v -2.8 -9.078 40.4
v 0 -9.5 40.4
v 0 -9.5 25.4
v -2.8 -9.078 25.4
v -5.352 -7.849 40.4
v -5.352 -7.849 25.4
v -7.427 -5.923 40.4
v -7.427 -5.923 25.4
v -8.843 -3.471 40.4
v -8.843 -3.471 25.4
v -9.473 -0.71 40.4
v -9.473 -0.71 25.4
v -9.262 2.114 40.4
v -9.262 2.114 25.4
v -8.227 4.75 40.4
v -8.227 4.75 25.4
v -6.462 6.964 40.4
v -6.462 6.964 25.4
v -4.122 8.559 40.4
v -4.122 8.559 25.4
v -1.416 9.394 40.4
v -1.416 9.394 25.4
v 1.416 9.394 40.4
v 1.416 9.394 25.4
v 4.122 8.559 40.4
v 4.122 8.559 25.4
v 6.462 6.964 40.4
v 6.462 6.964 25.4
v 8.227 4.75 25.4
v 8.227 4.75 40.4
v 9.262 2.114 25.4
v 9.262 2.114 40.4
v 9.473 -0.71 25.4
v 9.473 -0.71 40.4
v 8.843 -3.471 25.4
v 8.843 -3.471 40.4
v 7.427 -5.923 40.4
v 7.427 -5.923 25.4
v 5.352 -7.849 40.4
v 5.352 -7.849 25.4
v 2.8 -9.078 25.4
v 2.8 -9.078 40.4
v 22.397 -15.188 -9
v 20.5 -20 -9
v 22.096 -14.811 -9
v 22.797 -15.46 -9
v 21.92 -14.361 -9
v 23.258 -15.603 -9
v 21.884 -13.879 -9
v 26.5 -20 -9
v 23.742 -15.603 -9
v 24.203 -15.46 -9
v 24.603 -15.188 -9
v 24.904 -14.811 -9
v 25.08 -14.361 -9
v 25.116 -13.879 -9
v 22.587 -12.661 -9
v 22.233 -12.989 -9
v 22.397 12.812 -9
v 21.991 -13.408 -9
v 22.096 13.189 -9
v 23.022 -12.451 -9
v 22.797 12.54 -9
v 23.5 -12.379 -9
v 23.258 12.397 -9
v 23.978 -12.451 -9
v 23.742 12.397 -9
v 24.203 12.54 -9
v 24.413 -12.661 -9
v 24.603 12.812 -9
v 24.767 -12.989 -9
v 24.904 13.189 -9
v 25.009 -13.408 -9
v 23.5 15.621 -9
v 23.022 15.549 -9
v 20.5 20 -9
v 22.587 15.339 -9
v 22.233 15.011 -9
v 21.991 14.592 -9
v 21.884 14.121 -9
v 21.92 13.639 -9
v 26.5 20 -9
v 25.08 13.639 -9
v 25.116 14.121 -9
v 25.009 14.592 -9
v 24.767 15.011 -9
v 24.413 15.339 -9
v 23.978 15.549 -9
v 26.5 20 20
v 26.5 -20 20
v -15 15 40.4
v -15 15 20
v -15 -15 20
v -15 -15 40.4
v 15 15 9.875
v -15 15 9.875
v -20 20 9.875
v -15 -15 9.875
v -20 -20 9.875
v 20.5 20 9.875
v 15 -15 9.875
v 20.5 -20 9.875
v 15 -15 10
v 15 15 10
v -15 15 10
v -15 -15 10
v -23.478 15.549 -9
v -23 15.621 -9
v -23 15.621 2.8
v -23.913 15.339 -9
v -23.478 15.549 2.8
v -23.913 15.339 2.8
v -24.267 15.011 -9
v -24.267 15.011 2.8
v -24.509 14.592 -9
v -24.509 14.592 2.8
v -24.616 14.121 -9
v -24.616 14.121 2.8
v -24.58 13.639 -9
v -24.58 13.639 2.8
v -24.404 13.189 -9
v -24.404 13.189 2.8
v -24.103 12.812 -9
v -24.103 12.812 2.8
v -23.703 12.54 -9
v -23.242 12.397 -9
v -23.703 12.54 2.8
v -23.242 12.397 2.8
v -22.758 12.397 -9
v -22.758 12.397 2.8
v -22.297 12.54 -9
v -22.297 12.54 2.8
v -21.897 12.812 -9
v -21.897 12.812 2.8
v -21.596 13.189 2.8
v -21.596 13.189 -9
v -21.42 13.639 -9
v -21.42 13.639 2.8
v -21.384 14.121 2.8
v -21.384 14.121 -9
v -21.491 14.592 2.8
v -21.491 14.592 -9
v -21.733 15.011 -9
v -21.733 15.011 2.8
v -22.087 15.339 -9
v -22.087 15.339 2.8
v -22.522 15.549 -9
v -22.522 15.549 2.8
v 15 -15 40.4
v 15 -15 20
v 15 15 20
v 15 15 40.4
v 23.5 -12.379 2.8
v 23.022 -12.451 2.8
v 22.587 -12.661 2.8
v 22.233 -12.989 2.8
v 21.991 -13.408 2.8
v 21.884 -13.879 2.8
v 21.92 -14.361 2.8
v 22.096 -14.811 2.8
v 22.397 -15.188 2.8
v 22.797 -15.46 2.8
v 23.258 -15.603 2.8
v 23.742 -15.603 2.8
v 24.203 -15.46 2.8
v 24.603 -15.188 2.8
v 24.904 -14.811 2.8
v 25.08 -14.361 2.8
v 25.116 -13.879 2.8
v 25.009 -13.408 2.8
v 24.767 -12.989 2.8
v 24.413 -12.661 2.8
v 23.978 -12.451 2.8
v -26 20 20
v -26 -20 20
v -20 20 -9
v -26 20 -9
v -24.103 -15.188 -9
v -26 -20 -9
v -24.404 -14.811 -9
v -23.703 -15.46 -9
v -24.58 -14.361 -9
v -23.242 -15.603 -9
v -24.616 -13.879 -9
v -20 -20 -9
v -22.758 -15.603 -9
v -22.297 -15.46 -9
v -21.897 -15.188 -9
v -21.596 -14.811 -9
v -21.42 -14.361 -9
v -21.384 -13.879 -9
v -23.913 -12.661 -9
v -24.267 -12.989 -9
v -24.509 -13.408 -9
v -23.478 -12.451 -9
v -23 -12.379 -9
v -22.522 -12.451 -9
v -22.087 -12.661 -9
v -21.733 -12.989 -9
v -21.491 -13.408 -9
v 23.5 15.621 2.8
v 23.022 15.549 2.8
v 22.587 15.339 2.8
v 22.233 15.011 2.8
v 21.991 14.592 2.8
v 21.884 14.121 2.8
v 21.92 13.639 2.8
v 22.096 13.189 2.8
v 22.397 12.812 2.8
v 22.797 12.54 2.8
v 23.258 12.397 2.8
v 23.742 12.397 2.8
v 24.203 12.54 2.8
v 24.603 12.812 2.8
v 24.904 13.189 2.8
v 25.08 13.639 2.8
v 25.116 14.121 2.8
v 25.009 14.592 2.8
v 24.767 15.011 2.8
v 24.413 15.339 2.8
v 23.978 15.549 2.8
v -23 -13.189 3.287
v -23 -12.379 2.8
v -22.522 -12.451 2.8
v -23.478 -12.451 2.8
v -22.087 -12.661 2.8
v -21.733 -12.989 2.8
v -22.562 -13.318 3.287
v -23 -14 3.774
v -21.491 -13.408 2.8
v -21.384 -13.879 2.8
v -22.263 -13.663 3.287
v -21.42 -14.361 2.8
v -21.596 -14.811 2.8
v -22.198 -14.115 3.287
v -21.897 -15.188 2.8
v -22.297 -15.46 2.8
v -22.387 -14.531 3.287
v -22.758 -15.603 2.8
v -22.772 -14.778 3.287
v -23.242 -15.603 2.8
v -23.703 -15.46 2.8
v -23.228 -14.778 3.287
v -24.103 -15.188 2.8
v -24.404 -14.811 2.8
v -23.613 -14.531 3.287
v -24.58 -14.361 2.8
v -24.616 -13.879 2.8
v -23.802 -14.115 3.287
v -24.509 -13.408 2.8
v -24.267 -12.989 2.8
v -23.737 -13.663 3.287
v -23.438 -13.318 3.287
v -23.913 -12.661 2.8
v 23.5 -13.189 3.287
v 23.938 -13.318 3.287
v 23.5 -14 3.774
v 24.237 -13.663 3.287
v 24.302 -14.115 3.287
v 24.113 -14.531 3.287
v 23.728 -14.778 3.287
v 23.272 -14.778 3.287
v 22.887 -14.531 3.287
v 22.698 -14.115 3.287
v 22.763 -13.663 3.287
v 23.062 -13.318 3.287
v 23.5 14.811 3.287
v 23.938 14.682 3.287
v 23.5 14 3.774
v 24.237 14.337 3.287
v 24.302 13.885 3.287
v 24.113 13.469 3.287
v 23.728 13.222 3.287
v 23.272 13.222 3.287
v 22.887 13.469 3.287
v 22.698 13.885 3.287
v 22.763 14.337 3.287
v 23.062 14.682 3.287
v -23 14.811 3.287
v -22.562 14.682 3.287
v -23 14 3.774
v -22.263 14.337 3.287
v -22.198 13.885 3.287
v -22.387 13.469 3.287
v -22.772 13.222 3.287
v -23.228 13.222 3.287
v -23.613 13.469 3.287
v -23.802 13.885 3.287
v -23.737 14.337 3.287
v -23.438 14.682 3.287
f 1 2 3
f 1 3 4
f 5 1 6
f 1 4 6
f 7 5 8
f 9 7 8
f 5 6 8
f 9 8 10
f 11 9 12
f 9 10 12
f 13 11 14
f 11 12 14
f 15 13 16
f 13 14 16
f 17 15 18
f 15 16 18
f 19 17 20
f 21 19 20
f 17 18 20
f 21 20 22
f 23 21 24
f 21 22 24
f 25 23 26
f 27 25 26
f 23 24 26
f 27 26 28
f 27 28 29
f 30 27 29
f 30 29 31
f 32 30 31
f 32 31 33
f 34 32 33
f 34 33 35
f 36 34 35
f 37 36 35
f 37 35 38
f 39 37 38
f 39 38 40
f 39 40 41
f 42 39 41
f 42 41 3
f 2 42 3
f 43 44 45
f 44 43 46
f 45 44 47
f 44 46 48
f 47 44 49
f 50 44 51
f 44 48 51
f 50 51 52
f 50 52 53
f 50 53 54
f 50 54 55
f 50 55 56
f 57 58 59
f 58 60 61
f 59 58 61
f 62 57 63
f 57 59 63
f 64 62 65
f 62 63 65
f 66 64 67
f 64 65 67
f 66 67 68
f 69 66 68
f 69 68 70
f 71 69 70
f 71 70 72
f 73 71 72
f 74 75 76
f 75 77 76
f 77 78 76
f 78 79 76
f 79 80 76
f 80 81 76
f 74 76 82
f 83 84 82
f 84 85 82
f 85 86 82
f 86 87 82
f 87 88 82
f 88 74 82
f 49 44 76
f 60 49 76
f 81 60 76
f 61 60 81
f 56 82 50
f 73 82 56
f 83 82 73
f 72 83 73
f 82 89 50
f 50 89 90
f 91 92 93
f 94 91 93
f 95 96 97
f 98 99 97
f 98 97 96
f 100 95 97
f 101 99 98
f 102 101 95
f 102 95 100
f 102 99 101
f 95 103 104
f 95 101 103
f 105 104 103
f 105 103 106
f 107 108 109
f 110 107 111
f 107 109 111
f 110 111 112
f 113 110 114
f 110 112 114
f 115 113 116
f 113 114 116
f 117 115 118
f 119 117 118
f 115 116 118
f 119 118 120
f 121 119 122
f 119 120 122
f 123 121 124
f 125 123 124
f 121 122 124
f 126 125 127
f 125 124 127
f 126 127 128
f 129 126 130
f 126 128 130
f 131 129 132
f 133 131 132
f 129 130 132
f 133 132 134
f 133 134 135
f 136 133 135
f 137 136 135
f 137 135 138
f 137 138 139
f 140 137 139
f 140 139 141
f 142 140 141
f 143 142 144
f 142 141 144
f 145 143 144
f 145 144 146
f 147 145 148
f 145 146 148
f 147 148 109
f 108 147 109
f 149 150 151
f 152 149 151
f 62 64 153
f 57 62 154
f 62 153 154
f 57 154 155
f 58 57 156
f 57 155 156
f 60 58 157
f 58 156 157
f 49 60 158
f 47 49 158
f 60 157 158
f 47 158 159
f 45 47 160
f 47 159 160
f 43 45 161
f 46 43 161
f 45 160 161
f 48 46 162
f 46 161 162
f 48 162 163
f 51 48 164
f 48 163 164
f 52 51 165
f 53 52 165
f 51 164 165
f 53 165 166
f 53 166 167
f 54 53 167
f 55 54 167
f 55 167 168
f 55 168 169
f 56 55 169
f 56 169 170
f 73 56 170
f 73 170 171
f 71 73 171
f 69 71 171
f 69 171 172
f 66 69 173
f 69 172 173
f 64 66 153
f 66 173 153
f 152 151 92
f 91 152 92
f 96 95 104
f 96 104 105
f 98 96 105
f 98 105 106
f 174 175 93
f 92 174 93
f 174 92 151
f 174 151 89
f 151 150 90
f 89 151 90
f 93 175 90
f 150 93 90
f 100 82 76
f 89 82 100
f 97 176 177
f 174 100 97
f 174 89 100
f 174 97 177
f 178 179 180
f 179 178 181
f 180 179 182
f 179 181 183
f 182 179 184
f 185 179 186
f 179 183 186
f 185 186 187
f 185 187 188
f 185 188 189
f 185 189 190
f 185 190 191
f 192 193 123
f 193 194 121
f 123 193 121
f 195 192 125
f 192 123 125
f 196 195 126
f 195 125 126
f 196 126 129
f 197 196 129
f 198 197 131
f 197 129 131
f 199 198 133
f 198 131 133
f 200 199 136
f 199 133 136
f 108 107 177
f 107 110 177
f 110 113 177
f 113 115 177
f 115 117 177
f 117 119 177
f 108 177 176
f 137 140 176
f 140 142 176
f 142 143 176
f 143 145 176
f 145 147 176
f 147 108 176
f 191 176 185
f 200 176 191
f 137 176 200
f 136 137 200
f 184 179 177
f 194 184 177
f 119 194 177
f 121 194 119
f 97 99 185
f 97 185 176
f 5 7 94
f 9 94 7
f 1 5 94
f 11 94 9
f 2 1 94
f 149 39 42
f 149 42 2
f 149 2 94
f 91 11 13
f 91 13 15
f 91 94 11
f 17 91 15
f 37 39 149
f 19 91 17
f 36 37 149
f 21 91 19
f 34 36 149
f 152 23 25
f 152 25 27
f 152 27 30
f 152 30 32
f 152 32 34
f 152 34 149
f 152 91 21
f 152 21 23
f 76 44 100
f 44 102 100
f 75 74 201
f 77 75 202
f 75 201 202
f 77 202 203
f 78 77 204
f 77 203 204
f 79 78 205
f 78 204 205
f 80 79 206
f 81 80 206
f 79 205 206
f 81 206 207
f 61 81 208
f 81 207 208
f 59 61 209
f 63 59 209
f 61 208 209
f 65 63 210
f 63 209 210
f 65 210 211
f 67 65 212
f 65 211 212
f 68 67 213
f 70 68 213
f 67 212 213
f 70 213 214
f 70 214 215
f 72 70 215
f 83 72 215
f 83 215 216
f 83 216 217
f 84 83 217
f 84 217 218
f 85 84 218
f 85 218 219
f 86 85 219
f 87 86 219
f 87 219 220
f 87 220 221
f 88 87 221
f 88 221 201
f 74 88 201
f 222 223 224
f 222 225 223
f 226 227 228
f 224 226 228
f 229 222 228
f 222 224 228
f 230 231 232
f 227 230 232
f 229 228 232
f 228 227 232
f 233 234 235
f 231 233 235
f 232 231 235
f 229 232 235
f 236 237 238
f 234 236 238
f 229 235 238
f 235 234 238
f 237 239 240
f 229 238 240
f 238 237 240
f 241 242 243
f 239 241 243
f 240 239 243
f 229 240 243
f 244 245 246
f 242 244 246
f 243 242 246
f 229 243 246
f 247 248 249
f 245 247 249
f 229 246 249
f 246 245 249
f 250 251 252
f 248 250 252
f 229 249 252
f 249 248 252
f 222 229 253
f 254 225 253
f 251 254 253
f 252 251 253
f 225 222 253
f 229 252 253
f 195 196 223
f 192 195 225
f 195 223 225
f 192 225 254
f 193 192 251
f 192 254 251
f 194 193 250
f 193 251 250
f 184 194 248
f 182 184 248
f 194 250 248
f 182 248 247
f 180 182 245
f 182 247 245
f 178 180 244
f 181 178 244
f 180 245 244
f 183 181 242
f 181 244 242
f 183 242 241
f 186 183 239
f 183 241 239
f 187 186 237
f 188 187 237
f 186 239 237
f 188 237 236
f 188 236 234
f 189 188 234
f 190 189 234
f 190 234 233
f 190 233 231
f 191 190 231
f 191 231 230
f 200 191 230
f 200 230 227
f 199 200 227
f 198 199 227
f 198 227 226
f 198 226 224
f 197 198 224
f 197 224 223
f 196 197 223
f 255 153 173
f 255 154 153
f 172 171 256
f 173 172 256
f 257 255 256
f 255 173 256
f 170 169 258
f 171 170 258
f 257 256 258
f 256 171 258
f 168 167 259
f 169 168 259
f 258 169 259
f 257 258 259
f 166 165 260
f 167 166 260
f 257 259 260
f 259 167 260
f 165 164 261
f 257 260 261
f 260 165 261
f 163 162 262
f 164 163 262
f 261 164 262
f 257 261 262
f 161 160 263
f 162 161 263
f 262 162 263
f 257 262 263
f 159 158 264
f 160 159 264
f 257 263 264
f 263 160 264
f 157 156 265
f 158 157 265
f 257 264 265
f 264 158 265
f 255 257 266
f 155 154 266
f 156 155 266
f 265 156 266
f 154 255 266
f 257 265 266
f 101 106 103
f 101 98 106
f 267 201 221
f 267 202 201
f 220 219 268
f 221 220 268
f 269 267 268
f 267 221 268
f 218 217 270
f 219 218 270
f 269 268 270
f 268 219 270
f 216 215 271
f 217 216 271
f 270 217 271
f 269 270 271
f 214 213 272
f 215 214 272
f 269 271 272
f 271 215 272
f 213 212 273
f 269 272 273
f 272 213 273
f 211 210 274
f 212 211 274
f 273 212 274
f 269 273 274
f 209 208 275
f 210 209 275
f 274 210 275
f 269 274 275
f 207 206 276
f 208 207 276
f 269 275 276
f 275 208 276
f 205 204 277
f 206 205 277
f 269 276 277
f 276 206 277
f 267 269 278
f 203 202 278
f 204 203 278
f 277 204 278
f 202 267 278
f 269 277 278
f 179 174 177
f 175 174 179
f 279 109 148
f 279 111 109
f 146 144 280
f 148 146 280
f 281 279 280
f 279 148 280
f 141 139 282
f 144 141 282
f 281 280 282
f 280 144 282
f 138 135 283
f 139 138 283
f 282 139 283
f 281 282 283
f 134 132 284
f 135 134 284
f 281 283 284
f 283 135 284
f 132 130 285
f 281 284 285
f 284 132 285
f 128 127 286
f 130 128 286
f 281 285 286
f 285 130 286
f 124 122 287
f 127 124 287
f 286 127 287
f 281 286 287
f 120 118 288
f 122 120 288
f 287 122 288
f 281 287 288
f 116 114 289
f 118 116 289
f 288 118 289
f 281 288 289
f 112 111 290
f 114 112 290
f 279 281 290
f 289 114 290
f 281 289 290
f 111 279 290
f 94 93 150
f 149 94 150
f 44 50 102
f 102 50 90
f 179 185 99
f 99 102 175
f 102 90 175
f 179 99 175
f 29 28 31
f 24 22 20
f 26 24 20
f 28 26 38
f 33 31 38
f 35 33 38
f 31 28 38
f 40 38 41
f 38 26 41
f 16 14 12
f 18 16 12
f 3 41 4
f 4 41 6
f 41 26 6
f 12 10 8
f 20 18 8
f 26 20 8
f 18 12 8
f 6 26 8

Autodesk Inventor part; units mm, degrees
ref_plane "YZ Plane" through (0, 0, 0) normal (1, 0, 0) x (0, 1, 0)
ref_plane "XZ Plane" through (0, 0, 0) normal (0, 1, 0) x (-1, 0, 0)
ref_plane "XY Plane" through (0, 0, 0) normal (0, 0, 1) x (1, 0, 0)
sketch "Sketch1" plane through (0, 0, 0) normal (0, 1, 0) x (-1, 0, 0)
  line L0 (20, -0.25) -> (20, 20)
  line L1 (20, 20) -> (-20.5, 20)
  line L2 (-20.5, 20) -> (-20.5, -0.25)
  line L3 (20, 9.875) -> (-20.5, 9.875)
  dimension "d49" = 40.5
extrude "Extrusion1" add sketch "Sketch1" along normal mid plane 40
sketch "Sketch6" plane through (0, 0, 0) normal (0, 0, 1) x (1, 0, 0)
  line L0 (0, 0) -> (-15, 0)
  line L1 (-15, 0) -> (-15, -15)
  line L2 (-15, -15) -> (15, -15)
  line L3 (15, -15) -> (15, 15)
  line L4 (15, 15) -> (-15, 15)
  line L5 (-15, 15) -> (-15, 0)
  dimension "d64" = 15
  dimension "d65" = 15
  dimension "d66" = 90
  dimension "d67" = 30
  dimension "d68" = 90
  dimension "d69" = 30
  dimension "d70" = 90
  dimension "d71" = 30
  dimension "d72" = 90
extrude "Extrusion6" add sketch "Sketch6" along normal blind 40.4
hole "Hole2" at (0, 0, 40.4) direction (0, 0, -1) diameter 19 depth 15
fillet "Fillet3" [suppressed]
sketch "Sketch8" plane through (0, 0, 0) normal (0, 0, -1) x (-1, 0, 0)
  line L0 (15, -15) -> (-15, -15)
  line L1 (-15, -15) -> (-15, 15)
  line L2 (-15, 15) -> (15, 15)
  line L3 (15, 15) -> (15, -15)
  point P0 (0, 0)
extrude "Extrusion8" cut sketch "Sketch8" against normal blind 10
sketch "Sketch10" plane through (-20, 20, 20) normal (0, 0, 1) x (1, 0, 0)
  line L0 (0, 0) -> (-6, 0)
  line L1 (-6, 0) -> (-6, -40)
  line L2 (-6, -40) -> (0, -40)
  line L3 (0, -40) -> (0, 0)
  line L4 (40.5, 0) -> (46.5, 0)
  line L5 (46.5, 0) -> (46.5, -40)
  line L6 (46.5, -40) -> (40.5, -40)
  line L7 (40.5, -40) -> (40.5, 0)
  point P0 (20, -20)
  dimension "d73" = 6
  dimension "d74" = 6
  dimension "d75" = 40.5
extrude "Extrusion9" add sketch "Sketch10" against normal blind 29
hole "Hole3" at (23.5, 14, -9) direction (0, 0, 1) diameter 3.242 depth 11.8 tip angle 118 thread size "M4x0.7" class "6H" standard "ISO Metric profile"
hole "Hole4" at (23.5, -14, -9) direction (0, 0, 1) diameter 3.242 depth 11.8 tip angle 118 thread size "M4x0.7" class "6H" standard "ISO Metric profile"
hole "Hole5" at (-23, 14, -9) direction (0, 0, 1) diameter 3.242 depth 11.8 tip angle 118 thread size "M4x0.7" class "6H" standard "ISO Metric profile"
hole "Hole6" at (-23, -14, -9) direction (0, 0, 1) diameter 3.242 depth 11.8 tip angle 118 thread size "M4x0.7" class "6H" standard "ISO Metric profile"
properties part number "suporte-barra" material "Steel, Carbon"
